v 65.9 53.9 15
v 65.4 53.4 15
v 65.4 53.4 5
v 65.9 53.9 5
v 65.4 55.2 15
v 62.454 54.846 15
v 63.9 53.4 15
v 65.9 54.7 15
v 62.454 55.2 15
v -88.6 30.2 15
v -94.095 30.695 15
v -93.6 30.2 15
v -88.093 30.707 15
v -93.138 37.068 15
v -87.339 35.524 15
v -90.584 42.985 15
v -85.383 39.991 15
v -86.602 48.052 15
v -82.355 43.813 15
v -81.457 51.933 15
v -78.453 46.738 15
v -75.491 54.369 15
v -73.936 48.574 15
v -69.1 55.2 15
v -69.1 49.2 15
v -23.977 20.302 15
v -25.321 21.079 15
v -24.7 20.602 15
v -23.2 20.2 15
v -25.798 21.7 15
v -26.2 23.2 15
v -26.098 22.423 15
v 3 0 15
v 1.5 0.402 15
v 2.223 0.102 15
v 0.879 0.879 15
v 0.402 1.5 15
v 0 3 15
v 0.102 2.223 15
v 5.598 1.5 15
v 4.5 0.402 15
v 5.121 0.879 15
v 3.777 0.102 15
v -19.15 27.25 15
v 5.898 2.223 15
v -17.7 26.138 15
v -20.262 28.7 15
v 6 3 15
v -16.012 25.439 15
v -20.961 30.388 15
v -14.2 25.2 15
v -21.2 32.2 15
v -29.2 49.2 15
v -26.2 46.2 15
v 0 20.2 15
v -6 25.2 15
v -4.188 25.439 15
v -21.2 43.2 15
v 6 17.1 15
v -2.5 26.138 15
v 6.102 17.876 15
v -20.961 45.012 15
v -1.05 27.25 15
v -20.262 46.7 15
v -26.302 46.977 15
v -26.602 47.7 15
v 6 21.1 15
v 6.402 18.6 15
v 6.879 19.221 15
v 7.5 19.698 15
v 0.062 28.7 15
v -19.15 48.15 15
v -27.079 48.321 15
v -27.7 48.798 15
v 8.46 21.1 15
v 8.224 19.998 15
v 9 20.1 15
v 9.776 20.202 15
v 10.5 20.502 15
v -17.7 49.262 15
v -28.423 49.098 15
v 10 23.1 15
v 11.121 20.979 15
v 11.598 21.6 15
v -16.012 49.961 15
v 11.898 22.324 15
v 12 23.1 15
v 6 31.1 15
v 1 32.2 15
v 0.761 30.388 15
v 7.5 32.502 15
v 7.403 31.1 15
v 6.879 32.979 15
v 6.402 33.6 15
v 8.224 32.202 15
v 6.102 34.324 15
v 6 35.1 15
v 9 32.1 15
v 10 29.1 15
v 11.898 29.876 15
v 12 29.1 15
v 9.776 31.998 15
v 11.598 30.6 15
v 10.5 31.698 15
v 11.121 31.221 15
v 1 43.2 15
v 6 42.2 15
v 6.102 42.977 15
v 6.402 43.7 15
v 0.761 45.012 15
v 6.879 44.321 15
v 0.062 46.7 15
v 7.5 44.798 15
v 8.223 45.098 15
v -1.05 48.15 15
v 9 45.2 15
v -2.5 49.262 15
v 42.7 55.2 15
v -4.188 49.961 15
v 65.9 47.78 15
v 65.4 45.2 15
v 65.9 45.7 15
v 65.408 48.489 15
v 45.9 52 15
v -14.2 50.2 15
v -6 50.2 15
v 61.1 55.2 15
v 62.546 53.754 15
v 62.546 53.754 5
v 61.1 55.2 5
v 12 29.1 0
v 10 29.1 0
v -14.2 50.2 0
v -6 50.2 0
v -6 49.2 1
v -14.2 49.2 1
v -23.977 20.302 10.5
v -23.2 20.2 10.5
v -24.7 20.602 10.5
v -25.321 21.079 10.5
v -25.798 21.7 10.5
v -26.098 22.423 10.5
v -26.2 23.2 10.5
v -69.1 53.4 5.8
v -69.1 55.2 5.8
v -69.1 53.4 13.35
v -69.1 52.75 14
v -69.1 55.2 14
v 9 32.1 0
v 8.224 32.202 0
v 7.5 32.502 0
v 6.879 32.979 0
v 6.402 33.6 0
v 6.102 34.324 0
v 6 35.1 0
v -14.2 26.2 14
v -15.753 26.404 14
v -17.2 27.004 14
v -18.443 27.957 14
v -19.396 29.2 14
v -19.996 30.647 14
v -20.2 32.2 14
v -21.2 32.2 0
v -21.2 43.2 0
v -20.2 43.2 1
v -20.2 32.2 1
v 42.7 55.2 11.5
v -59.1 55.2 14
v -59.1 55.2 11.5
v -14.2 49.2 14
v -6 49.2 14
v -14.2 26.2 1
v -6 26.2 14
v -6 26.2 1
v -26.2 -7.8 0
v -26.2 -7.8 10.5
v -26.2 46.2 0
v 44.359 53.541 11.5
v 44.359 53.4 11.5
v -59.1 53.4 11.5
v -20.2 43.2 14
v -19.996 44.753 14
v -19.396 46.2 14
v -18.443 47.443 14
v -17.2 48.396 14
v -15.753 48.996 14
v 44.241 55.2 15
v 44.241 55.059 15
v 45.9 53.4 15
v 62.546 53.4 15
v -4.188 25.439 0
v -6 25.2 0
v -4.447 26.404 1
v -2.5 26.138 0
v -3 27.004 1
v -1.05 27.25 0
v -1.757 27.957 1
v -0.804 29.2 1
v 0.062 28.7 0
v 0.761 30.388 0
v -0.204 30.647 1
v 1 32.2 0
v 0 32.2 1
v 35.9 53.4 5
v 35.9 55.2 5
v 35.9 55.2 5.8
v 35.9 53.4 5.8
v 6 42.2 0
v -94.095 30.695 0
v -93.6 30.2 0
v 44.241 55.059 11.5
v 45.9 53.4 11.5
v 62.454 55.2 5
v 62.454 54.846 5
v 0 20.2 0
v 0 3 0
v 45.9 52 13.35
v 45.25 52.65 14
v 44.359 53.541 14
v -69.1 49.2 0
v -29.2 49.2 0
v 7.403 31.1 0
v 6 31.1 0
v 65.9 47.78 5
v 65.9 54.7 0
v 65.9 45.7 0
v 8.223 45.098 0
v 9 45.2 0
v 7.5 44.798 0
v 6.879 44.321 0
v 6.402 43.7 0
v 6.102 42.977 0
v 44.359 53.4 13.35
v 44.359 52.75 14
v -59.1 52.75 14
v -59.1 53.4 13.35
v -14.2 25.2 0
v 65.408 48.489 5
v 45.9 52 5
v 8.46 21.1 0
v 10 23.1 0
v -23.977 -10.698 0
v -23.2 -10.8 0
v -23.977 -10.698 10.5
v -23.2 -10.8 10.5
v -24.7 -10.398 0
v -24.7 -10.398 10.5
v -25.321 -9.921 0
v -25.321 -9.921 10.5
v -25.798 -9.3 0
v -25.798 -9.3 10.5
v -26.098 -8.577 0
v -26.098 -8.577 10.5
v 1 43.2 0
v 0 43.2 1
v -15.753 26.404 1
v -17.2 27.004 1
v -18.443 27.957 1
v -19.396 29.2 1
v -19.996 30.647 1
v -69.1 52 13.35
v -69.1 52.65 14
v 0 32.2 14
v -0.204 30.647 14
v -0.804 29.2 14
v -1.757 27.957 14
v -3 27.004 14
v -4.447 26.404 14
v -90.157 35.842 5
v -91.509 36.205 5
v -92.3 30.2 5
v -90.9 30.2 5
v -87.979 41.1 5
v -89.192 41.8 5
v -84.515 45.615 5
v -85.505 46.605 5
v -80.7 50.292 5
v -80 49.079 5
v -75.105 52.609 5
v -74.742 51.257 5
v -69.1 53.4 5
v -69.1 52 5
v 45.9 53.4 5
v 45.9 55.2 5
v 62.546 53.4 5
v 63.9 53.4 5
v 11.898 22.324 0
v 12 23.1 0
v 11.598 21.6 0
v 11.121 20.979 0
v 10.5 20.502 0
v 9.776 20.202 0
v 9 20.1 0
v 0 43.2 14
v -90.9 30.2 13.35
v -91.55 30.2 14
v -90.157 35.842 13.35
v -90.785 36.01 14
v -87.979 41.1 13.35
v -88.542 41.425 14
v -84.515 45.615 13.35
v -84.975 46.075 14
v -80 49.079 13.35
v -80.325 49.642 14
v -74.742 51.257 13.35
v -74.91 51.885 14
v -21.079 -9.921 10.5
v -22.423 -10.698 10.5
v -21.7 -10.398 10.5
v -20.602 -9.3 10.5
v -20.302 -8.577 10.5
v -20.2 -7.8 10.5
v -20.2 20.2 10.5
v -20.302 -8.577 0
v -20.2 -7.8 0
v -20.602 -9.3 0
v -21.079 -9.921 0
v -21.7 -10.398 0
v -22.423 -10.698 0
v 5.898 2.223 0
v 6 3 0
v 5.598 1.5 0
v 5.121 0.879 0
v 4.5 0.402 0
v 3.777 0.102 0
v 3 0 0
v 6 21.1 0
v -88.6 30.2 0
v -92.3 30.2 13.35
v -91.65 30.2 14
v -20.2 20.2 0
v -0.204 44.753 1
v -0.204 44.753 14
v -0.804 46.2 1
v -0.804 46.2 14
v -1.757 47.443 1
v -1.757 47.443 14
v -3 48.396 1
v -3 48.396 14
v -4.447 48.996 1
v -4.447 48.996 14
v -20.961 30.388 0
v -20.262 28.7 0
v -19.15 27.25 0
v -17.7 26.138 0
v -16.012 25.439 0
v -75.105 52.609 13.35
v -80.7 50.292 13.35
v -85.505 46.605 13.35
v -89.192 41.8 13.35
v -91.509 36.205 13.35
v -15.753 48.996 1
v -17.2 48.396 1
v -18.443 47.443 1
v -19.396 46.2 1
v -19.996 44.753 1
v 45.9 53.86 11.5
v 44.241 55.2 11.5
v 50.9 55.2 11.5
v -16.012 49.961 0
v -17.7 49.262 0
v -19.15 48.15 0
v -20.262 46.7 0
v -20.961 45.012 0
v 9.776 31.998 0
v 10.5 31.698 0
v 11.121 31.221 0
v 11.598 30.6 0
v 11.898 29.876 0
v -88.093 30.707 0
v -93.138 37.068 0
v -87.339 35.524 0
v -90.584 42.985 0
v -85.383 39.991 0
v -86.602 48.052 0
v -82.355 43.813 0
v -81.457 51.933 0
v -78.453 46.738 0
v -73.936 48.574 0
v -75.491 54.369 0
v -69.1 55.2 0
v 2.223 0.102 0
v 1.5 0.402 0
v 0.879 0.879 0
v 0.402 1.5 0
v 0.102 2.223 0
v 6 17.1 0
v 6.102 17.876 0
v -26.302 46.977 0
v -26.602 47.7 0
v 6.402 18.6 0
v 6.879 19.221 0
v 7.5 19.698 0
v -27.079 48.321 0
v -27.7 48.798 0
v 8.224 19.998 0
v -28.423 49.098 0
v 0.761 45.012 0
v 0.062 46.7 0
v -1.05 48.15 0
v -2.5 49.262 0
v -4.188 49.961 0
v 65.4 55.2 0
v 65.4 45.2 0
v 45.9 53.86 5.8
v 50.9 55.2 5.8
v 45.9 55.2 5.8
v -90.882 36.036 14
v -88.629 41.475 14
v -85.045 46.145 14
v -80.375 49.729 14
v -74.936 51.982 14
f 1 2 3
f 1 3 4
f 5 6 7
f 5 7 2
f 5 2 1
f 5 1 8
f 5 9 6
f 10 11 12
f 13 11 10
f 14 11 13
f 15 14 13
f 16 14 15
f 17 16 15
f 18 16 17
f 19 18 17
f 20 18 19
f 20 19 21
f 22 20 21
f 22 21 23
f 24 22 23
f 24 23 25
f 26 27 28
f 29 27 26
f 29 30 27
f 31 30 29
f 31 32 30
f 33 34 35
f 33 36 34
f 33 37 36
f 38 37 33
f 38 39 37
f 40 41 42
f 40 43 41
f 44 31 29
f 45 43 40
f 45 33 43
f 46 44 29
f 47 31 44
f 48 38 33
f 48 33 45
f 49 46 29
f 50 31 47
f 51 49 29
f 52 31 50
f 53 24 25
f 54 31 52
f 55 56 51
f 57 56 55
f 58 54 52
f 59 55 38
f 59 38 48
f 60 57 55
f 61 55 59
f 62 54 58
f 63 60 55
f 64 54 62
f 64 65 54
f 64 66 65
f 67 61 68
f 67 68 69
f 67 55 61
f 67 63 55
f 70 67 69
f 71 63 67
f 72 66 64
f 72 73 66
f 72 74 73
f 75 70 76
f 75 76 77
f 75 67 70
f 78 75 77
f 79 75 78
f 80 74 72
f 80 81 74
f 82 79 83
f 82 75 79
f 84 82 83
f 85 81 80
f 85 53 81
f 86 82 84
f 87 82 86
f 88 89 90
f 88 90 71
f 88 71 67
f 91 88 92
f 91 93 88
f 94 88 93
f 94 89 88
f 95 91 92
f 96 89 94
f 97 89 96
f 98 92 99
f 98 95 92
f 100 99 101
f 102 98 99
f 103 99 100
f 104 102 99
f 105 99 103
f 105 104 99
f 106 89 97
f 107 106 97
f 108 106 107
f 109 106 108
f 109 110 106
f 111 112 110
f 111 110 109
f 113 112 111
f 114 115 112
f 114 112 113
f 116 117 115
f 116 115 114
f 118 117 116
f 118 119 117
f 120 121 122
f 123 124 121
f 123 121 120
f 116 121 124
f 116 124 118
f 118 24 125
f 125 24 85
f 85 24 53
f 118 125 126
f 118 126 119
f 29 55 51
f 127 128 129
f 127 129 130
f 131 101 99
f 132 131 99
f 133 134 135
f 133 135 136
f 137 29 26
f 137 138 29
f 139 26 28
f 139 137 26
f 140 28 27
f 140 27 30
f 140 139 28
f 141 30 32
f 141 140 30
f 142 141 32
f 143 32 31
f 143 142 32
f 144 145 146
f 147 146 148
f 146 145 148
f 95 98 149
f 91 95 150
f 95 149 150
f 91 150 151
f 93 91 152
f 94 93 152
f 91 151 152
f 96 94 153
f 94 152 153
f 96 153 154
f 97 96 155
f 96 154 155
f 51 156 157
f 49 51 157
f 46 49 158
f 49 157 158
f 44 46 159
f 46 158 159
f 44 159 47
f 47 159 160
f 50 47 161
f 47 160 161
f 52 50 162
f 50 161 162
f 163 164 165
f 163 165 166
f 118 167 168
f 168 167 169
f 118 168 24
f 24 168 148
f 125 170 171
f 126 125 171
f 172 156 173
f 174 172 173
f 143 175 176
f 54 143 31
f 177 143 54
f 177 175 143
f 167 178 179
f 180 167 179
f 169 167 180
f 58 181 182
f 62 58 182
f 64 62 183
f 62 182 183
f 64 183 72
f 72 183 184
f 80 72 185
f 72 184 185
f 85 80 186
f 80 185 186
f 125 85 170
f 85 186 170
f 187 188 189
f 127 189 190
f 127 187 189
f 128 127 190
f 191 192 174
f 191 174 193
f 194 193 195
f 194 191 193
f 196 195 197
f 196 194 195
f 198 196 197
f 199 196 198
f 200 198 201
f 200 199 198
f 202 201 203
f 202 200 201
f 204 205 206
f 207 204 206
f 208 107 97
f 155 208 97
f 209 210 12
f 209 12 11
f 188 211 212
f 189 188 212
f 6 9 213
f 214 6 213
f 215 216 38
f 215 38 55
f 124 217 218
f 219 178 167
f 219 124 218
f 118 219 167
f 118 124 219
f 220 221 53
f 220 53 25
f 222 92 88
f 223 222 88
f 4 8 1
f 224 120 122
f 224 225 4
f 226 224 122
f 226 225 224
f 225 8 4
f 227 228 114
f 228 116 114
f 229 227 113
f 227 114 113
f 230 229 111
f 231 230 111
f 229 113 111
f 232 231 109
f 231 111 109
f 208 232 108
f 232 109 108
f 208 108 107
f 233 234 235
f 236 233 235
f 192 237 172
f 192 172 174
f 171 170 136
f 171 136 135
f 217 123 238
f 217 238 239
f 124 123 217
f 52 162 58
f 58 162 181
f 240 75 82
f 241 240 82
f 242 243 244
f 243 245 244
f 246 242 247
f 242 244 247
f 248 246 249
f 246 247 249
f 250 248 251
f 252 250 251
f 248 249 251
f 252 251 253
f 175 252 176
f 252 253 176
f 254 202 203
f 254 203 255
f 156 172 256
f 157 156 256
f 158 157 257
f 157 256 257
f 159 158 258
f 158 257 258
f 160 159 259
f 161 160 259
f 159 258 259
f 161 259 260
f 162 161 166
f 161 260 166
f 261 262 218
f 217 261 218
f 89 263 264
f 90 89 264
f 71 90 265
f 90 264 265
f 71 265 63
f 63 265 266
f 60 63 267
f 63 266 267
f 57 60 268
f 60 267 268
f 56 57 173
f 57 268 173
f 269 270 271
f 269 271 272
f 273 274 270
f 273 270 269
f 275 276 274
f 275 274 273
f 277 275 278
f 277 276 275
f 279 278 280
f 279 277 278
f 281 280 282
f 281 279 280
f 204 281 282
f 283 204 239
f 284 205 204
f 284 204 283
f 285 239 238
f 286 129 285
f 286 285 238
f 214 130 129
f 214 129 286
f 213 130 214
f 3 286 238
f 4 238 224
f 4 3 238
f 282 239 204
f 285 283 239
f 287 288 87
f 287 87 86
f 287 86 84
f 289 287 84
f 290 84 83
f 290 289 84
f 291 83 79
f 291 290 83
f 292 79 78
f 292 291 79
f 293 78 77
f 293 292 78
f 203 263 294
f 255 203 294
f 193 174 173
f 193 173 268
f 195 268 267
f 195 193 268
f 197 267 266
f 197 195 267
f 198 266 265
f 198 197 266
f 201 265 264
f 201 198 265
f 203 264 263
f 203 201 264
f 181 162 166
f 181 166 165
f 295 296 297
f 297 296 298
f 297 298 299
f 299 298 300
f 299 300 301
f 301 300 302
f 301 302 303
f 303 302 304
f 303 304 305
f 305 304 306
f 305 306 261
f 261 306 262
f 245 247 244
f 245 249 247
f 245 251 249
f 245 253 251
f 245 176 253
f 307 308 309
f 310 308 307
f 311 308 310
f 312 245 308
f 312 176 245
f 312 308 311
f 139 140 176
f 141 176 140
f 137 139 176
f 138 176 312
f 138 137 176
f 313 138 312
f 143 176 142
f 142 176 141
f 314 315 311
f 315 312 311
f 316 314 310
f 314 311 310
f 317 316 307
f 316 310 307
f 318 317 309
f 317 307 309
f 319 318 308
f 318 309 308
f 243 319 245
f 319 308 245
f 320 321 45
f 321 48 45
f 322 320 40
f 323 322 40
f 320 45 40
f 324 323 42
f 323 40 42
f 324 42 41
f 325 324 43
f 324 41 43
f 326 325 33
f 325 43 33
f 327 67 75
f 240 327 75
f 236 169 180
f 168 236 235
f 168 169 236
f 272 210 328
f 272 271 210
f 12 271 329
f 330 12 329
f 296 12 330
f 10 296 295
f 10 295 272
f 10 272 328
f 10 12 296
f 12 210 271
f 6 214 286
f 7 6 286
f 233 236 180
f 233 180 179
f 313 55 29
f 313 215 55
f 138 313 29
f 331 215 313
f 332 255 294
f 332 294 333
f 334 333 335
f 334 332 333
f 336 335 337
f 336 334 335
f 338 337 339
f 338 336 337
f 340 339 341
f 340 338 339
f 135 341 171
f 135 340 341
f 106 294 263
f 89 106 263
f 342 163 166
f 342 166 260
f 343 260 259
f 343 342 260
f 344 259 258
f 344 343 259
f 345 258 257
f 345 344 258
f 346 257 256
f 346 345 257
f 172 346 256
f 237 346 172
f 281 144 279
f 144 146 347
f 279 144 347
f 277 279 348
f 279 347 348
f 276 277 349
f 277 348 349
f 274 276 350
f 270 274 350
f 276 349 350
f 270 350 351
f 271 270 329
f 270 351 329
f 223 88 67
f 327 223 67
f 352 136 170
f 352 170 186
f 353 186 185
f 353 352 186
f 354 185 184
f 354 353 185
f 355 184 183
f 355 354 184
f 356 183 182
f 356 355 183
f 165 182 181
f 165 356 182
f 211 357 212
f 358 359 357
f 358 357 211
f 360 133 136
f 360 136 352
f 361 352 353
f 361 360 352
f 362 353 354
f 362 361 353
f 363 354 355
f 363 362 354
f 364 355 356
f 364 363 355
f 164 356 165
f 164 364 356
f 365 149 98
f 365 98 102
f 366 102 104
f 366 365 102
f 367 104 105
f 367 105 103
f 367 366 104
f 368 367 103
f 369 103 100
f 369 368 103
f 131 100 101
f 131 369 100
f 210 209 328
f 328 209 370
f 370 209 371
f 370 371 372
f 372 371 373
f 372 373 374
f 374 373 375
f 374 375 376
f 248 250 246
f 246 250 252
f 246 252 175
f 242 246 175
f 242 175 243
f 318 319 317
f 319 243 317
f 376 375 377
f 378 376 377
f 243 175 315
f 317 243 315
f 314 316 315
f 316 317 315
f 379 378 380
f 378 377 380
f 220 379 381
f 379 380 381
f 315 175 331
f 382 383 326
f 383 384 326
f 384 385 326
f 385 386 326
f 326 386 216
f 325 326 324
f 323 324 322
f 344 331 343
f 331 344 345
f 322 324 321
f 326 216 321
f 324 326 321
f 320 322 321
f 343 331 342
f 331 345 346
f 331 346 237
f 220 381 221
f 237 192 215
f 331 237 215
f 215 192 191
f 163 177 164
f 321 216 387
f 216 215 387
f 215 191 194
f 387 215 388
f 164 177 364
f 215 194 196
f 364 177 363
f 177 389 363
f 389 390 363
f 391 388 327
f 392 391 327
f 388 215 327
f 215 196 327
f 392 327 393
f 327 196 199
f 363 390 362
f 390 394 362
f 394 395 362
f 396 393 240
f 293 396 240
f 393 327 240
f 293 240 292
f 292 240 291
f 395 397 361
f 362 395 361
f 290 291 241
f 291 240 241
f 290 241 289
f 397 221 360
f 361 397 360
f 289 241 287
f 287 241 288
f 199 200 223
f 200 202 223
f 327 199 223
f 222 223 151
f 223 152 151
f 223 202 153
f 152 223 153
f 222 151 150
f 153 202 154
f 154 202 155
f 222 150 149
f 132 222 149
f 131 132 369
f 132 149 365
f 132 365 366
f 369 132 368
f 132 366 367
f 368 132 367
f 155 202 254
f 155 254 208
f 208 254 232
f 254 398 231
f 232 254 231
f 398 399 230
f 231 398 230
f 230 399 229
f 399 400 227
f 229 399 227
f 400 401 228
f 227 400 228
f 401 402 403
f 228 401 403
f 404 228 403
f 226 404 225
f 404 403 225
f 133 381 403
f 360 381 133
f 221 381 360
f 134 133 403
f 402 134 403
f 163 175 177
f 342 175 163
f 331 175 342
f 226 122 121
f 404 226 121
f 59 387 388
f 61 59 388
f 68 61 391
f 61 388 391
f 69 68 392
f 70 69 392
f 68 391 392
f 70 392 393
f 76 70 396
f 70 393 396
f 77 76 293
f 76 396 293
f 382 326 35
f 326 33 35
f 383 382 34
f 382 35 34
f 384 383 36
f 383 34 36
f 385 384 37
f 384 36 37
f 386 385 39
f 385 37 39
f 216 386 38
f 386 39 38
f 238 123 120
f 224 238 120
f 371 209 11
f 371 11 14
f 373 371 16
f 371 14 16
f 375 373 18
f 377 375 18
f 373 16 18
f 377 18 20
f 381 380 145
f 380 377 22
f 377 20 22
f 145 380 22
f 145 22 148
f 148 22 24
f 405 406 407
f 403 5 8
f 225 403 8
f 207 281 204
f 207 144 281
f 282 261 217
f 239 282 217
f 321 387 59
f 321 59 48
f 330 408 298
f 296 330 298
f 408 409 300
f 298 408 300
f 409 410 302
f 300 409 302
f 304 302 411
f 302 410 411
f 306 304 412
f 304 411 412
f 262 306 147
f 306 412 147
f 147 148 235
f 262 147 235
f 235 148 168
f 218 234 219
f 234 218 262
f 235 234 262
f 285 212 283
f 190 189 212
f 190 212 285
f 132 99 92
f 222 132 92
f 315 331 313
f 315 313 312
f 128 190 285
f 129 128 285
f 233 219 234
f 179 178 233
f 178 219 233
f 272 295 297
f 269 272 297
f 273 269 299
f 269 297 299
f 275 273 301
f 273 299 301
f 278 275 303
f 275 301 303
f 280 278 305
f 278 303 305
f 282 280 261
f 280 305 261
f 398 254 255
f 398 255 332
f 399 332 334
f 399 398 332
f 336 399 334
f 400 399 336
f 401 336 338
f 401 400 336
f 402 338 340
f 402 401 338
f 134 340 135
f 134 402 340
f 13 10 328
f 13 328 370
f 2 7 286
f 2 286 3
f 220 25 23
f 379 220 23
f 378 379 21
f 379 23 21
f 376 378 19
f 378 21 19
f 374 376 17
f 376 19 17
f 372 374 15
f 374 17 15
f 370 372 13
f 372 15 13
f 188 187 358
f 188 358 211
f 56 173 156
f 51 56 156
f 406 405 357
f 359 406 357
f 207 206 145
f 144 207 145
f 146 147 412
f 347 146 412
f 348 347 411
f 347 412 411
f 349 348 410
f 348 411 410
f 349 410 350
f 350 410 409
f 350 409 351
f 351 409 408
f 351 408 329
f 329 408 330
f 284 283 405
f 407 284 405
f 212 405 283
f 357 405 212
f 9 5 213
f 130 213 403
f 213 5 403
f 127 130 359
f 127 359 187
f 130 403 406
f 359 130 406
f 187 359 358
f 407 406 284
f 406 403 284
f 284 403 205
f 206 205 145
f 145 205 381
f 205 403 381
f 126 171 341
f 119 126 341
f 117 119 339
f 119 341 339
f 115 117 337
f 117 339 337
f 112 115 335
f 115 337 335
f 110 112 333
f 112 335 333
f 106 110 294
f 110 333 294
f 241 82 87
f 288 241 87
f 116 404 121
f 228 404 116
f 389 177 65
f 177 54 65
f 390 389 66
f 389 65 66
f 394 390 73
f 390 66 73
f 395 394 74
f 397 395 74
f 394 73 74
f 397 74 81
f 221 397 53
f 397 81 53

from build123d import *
from OCP.BRepFilletAPI import BRepFilletAPI_MakeChamfer

# Parameters (mm, degrees)
BOSS_EXTRUDE1_DEPTH = 15
BOSS_EXTRUDE2_DEPTH = 15
SKETCH6_W           = 115
SKETCH6_H           = 1.4
CUT_EXTRUDE2_DEPTH  = 10
CUT_EXTRUDE3_DEPTH  = 10
CUT_EXTRUDE4_DEPTH  = 10
BOSS_EXTRUDE3_DEPTH = 1
CUT_EXTRUDE5_REACH  = 117.913
SKETCH10_W          = 115
SKETCH10_H          = 5.7
SKETCH13_W          = 20.2
SKETCH13_H          = 23
CUT_EXTRUDE6_DEPTH  = 111.121977825
FILLET1_R           = 6
SKETCH14_W          = 6
SKETCH14_H          = 31
CUT_EXTRUDE7_DEPTH  = 4.5
FILLET2_R           = 3
SKETCH16_W          = 10
SKETCH16_H          = 2.5
CUT_EXTRUDE8_DEPTH  = 1.8
CHAMFER1_SIZE       = 0.5
CHAMFER1_SIZE_2     = 0.619555405
CHAMFER2_SIZE       = 1
CHAMFER3_SIZE       = 5
CHAMFER3_SIZE2      = 1.339745962
CUT_EXTRUDE12_REACH = 112.118
CHAMFER4_SIZE       = 0.2
CHAMFER4_SIZE_2     = 0.141421356
SKETCH25_W          = 6
SKETCH25_H          = 12
BOSS_EXTRUDE6_DEPTH = 15
FILLET4_START       = -1
FILLET4_DEPTH       = 16
FILLET4_2_DEPTH     = 15
CUT_EXTRUDE15_DEPTH = 15
CUT_EXTRUDE16_DEPTH = 10
CHAMFER5_SIZE       = 0.5
CHAMFER5_SIZE2      = 0.353553391
CHAMFER6_SIZE       = 0.65
SKETCH29_W          = 10
SKETCH29_H          = 0.8
CUT_EXTRUDE17_DEPTH = 3.2


with BuildPart() as part:
    # Sketch3 → Boss-Extrude1 (new body)
    with BuildSketch(Plane.XY):
        Polygon((0, 0), (0, 20.2), (-20.2, 20.2), (-20.2, -10.8), (-26.2, -10.8), (-26.2, 49.2), (-69.1, 49.2), (-69.1, 55.2), (5.9, 55.2), (65.9, 55.2), (65.9, 45.2), (6, 45.2), (6, 0), align=None)
    extrude(amount=BOSS_EXTRUDE1_DEPTH)

    # Sketch4 → Boss-Extrude2 (add)
    with BuildSketch(Plane.XY.offset(15)):
        with BuildLine():
            Line((-88.1, 30.2), (-94.1, 30.2))
            ThreePointArc((-94.1, 30.2), (-86.77766953, 47.87766953), (-69.1, 55.2))
            Line((-69.1, 55.2), (-69.1, 49.2))
            ThreePointArc((-69.1, 49.2), (-82.535028843, 43.635028843), (-88.1, 30.2))
        make_face()
    extrude(amount=-BOSS_EXTRUDE2_DEPTH)

    # Sketch6 → Cut-Extrude2 (cut)
    with BuildSketch(Plane.XY.offset(15)):
        with Locations((-11.6, 52.7)):
            Rectangle(SKETCH6_W, SKETCH6_H)
    extrude(amount=-CUT_EXTRUDE2_DEPTH, mode=Mode.SUBTRACT)

    # Sketch7 → Cut-Extrude3 (cut)
    with BuildSketch(Plane.XY.offset(15)):
        with BuildLine():
            Line((-92.3, 30.2), (-90.9, 30.2))
            ThreePointArc((-90.9, 30.2), (-84.51492783, 45.61492783), (-69.1, 52))
            Line((-69.1, 52), (-69.1, 53.4))
            ThreePointArc((-69.1, 53.4), (-85.504877324, 46.604877324), (-92.3, 30.2))
        make_face()
    extrude(amount=-CUT_EXTRUDE3_DEPTH, mode=Mode.SUBTRACT)

    # Sketch8 → Cut-Extrude4 (cut)
    with BuildSketch(Plane.XY.offset(15)):
        Polygon((45.9, 53.4), (65.9, 53.4), (65.9, 48.4), (45.9, 52), align=None)
    extrude(amount=-CUT_EXTRUDE4_DEPTH, mode=Mode.SUBTRACT)

    # Sketch9 → Boss-Extrude3 (add)
    with BuildSketch(Plane.XY.offset(15)):
        with BuildLine():
            Line((-69.1, 52), (45.9, 52))
            Line((45.9, 52), (45.9, 53.4))
            Line((45.9, 53.4), (-69.1, 53.4))
            ThreePointArc((-69.1, 53.4), (-85.504877324, 46.604877324), (-92.3, 30.2))
            Line((-92.3, 30.2), (-90.9, 30.2))
            ThreePointArc((-90.9, 30.2), (-84.51492783, 45.61492783), (-69.1, 52))
        make_face()
    extrude(amount=-BOSS_EXTRUDE3_DEPTH)

    # Cut-Extrude5: up to this face of the body (flat: up to its plane)
    cut_extrude5_end = Plane(part.part.faces().sort_by_distance((-11.6, 52, 9.5))[0])
    # Sketch10 → Cut-Extrude5 (cut, up to the picked face)
    with BuildSketch(Plane(origin=(0, 55.2, 0), x_dir=(-1, 0, 0), z_dir=(0, 1, 0)), mode=Mode.PRIVATE) as cut_extrude5_sk1:
        with Locations((11.6, 8.65)):
            Rectangle(SKETCH10_W, SKETCH10_H)
    cut_extrude5_tool1 = split(extrude(cut_extrude5_sk1.sketch, amount=-CUT_EXTRUDE5_REACH, mode=Mode.PRIVATE), bisect_by=cut_extrude5_end, keep=Keep.BOTH, mode=Mode.PRIVATE)
    add(cut_extrude5_tool1.solids().sort_by(Axis((-11.6, 55.2, 8.65), (0, -1, 0)))[0], mode=Mode.SUBTRACT)

    # Sketch13 → Cut-Extrude6 (cut, through all)
    with BuildSketch(Plane.XY.offset(15)):
        with Locations((-10.1, 37.7)):
            Rectangle(SKETCH13_W, SKETCH13_H)
    extrude(amount=-CUT_EXTRUDE6_DEPTH, mode=Mode.SUBTRACT)

    # Fillet1
    fillet1_edges = [part.edges().sort_by_distance(p)[0] for p in [
        (-20.2, 26.2, 7.5),
        (-20.2, 49.2, 7.5),
        (0, 49.2, 7.5),
        (0, 26.2, 7.5),
    ]]
    fillet(fillet1_edges, radius=FILLET1_R)

    # Sketch14 → Cut-Extrude7 (cut)
    with BuildSketch(Plane.XY.offset(15)):
        with Locations((-23.2, 4.7)):
            Rectangle(SKETCH14_W, SKETCH14_H)
    extrude(amount=-CUT_EXTRUDE7_DEPTH, mode=Mode.SUBTRACT)

    # Fillet2
    fillet2_edges = [part.edges().sort_by_distance(p)[0] for p in [
        (-26.2, 49.2, 7.5),
        (6, 45.2, 7.5),
        (-26.2, 20.2, 12.75),
        (6, 0, 7.5),
        (0, 0, 7.5),
        (-20.2, -10.8, 5.25),
        (-26.2, -10.8, 5.25),
    ]]
    fillet(fillet2_edges, radius=FILLET2_R - 0.0001)  # a hair under: the kernel refuses the full size

    # Sketch16 → Cut-Extrude8 (cut)
    with BuildSketch(Plane(origin=(0, 55.2, 0), x_dir=(-1, 0, 0), z_dir=(0, 1, 0))):
        with Locations((64.1, 12.75)):
            Rectangle(SKETCH16_W, SKETCH16_H)
    extrude(amount=-CUT_EXTRUDE8_DEPTH, mode=Mode.SUBTRACT)

    # Chamfer1
    # the kernel refuses this chamfer: 0.619555405, 0.5 mm, written as the material it takes off along each edge
    with BuildSketch(Plane(origin=(65.9, 55.2, -1.285841494), x_dir=(-1, 0, 0), z_dir=(0, 0, 1)), Plane(origin=(65.9, 45.2, -1.285841494), x_dir=(0, 1, 0), z_dir=(0, 0, 1))) as chamfer1_piece_1:
        Polygon((CHAMFER1_SIZE, 0), (0, CHAMFER1_SIZE), (0, 0), align=None)
    extrude(amount=17.571682988, mode=Mode.SUBTRACT)
    with BuildSketch(Plane(origin=(-88.1, 30.2, 16.303301327), x_dir=(-1, 0, 0), z_dir=(0, 0, -1))) as chamfer1_piece_2:
        with BuildLine():
            Line((CHAMFER1_SIZE, 0), (-0.006759226, 0.506759226))
            ThreePointArc((-0.006759226, 0.506759226), (-0.001786833, 0.26056951), (0, 0))
            Line((0, 0), (CHAMFER1_SIZE, 0))
        make_face()
    extrude(amount=17.606602654, mode=Mode.SUBTRACT)
    with BuildSketch(Plane(origin=(-94.1, 30.2, 16.285841494), x_dir=(1, 0, 0), z_dir=(0, 0, -1))) as chamfer1_piece_3:
        with BuildLine():
            Line((CHAMFER1_SIZE, 0), (0.004902903, -0.495097097))
            ThreePointArc((0.004902903, -0.495097097), (0.001296043, -0.254559377), (0, 0))
            Line((0, 0), (CHAMFER1_SIZE, 0))
        make_face()
    extrude(amount=17.571682988, mode=Mode.SUBTRACT)
    with BuildSketch(Plane(origin=(65.9, 53.4, 16.285841494), x_dir=(-1, 0, 0), z_dir=(0, 0, -1))) as chamfer1_piece_4:
        Polygon((CHAMFER1_SIZE, 0), (0, CHAMFER1_SIZE), (0, 0), align=None)
    extrude(amount=11.285841494, mode=Mode.SUBTRACT)
    with BuildSketch(Plane(origin=(65.9, 48.4, 16.600156341), x_dir=(-0.9841833239736955, 0.17715299831526463, 0), z_dir=(0, 0, -1))) as chamfer1_piece_5:
        Polygon((CHAMFER1_SIZE, 0), (-CHAMFER1_SIZE_2 * 0.177152998223, -CHAMFER1_SIZE_2 * 0.984183323461), (0, 0), align=None)
    extrude(amount=11.600156341, mode=Mode.SUBTRACT)

    # Chamfer2
    chamfer2_edges = [part.edges().sort_by_distance(p)[0] for p in [
        (-10.1, 49.2, 15),
        (-10.1, 49.2, 0),
        (0, 37.7, 15),
        (0, 37.7, 0),
        (-10.1, 26.2, 15),
        (-10.1, 26.2, 0),
        (-20.2, 37.7, 15),
        (-20.2, 37.7, 0),
        (-1.757359313, 47.442640687, 15),
        (-1.757359313, 47.442640687, 0),
        (-1.757359313, 27.957359313, 15),
        (-1.757359313, 27.957359313, 0),
        (-18.442640687, 27.957359313, 15),
        (-18.442640687, 27.957359313, 0),
        (-18.442640687, 47.442640687, 15),
        (-18.442640687, 47.442640687, 0),
    ]]
    chamfer(chamfer2_edges, length=CHAMFER2_SIZE)

    # Chamfer3
    chamfer3_edges = [part.edges().sort_by_distance(p)[0] for p in [
        (45.9, 55.2, 8.65),
    ]]
    chamfer3_side = [part.faces().sort_by_distance(p)[0] for p in [
        (64.046661535, 55.2, 7.5),
    ]]
    chamfer(chamfer3_edges, length=CHAMFER3_SIZE, length2=CHAMFER3_SIZE2, reference=chamfer3_side[0])

    # Cut-Extrude12: up to this face of the body (flat: up to its plane)
    cut_extrude12_end = Plane(part.part.faces().sort_by_distance((-5.656799941, 54.307895333, 11.5))[0])
    # Sketch20 → Cut-Extrude12 (cut, up to the picked face)
    with BuildSketch(Plane.XY.offset(15), mode=Mode.PRIVATE) as cut_extrude12_sk1:
        Polygon((45.9, 52), (42.7, 55.2), (44.1, 55.2), (45.9, 53.4), align=None)
    cut_extrude12_tool1 = split(extrude(cut_extrude12_sk1.sketch, amount=-CUT_EXTRUDE12_REACH, mode=Mode.PRIVATE), bisect_by=cut_extrude12_end, keep=Keep.BOTH, mode=Mode.PRIVATE)
    add(cut_extrude12_tool1.solids().sort_by(Axis((44.617333, 53.917333, 15), (0, 0, -1)))[0], mode=Mode.SUBTRACT)

    # Chamfer4
    # the kernel refuses this chamfer: 0.2, 0.141421356 mm, written as the material it takes off along each edge
    with BuildSketch(Plane(origin=(44.5, 53.4, 10.985663402), x_dir=(-0.7071067811865476, 0.7071067811865476, 0), z_dir=(0, 0, 1))) as chamfer4_piece_1:
        Polygon((CHAMFER4_SIZE, 0), (CHAMFER4_SIZE_2 * 0.707106782373, CHAMFER4_SIZE_2 * 0.707106782373), (0, 0), align=None)
    extrude(amount=3.014336598, mode=Mode.SUBTRACT)
    with BuildSketch(Plane(origin=(44.1, 55.2, 15.514336598), x_dir=(1, 0, 0), z_dir=(0, 0, -1))) as chamfer4_piece_2:
        Polygon((CHAMFER4_SIZE_2 * 1.00000000168, 0), (CHAMFER4_SIZE * 0.707106781187, CHAMFER4_SIZE * 0.707106781186), (0, 0), align=None)
    extrude(amount=4.528673195, mode=Mode.SUBTRACT)

    # Sketch25 → Boss-Extrude6 (add)
    with BuildSketch(Plane.XY.offset(15)):
        with Locations((9, 26.1)):
            Rectangle(SKETCH25_W, SKETCH25_H)
    extrude(amount=-BOSS_EXTRUDE6_DEPTH)

    # Fillet4: read off the stored shape, not the designer's step
    # Fillet4 outline → Fillet4 (cut)
    with BuildSketch(Plane.XY.offset(FILLET4_START)):
        with BuildLine():
            ThreePointArc((9, 32.1), (11.121320344, 31.221320344), (12, 29.1))
            Line((12, 29.1), (12, 32.1))
            Line((12, 32.1), (9, 32.1))
        make_face()
        with BuildLine():
            ThreePointArc((12, 23.1), (11.121320344, 20.978679656), (9, 20.1))
            Line((9, 20.1), (12, 20.1))
            Line((12, 20.1), (12, 23.1))
        make_face()
    extrude(amount=FILLET4_DEPTH, mode=Mode.SUBTRACT)

    # Fillet4 2 outline → Fillet4 2 (add)
    with BuildSketch(Plane.XY):
        with BuildLine():
            Line((6, 32.1), (9, 32.1))
            ThreePointArc((9, 32.1), (6.878679656, 32.978679656), (6, 35.1))
            Line((6, 35.1), (6, 32.1))
        make_face()
        with BuildLine():
            ThreePointArc((6, 17.1), (6.878679656, 19.221320344), (9, 20.1))
            Line((9, 20.1), (6, 20.1))
            Line((6, 20.1), (6, 17.1))
        make_face()
    extrude(amount=FILLET4_2_DEPTH)

    # Sketch26 → Cut-Extrude15 (cut)
    with BuildSketch(Plane.XY.offset(15)):
        Polygon((12, 29.1), (10, 29.1), (7.402667467, 31.1), (6, 31.1), (6, 21.1), (8.459958458, 21.1), (10, 23.1), (12, 23.1), align=None)
    extrude(amount=-CUT_EXTRUDE15_DEPTH, mode=Mode.SUBTRACT)

    # Sketch27 → Cut-Extrude16 (cut)
    with BuildSketch(Plane.XY.offset(15)):
        Polygon((62.9, 53.4), (61.1, 55.2), (62.1, 55.2), (63.9, 53.4), align=None)
    extrude(amount=-CUT_EXTRUDE16_DEPTH, mode=Mode.SUBTRACT)

    # Chamfer5: one chamfer whose edges measure the first distance from different faces: ONE call of the kernel's chamfer builder (chamfer() names one face for all edges)
    chamfer5_edges_1 = [part.edges().sort_by_distance(p)[0] for p in [
        (62.9, 53.4, 10),
    ]]
    chamfer5_side_1 = [part.faces().sort_by_distance(p)[0] for p in [
        (62, 54.3, 10),
    ]]
    chamfer5_edges_2 = [part.edges().sort_by_distance(p)[0] for p in [
        (62.1, 55.2, 10),
    ]]
    chamfer5_side_2 = [part.faces().sort_by_distance(p)[0] for p in [
        (63, 54.3, 10),
    ]]
    chamfer5 = BRepFilletAPI_MakeChamfer(part.part.solid().wrapped)
    for e in chamfer5_edges_1:
        chamfer5.Add(CHAMFER5_SIZE, CHAMFER5_SIZE2, e.wrapped, chamfer5_side_1[0].wrapped)  # the first distance lies on this face
    for e in chamfer5_edges_2:
        chamfer5.Add(CHAMFER5_SIZE, CHAMFER5_SIZE2, e.wrapped, chamfer5_side_2[0].wrapped)  # the first distance lies on this face
    add(Compound.cast(chamfer5.Shape()), mode=Mode.REPLACE)

    # Chamfer6
    chamfer6_edges = [part.edges().sort_by_distance(p)[0] for p in [
        (-84.51492783, 45.61492783, 14),
        (-85.504877324, 46.604877324, 14),
        (-11.6, 52, 14),
        (-7.370710678, 53.4, 14),
    ]]
    chamfer(chamfer6_edges, length=CHAMFER6_SIZE)

    # Sketch29 → Cut-Extrude17 (cut)
    with BuildSketch(Plane(origin=(0, 55.2, 0), x_dir=(-1, 0, 0), z_dir=(0, 1, 0))):
        with Locations((-40.9, 5.4)):
            Rectangle(SKETCH29_W, SKETCH29_H)
    extrude(amount=-CUT_EXTRUDE17_DEPTH, mode=Mode.SUBTRACT)


solid = part.part
